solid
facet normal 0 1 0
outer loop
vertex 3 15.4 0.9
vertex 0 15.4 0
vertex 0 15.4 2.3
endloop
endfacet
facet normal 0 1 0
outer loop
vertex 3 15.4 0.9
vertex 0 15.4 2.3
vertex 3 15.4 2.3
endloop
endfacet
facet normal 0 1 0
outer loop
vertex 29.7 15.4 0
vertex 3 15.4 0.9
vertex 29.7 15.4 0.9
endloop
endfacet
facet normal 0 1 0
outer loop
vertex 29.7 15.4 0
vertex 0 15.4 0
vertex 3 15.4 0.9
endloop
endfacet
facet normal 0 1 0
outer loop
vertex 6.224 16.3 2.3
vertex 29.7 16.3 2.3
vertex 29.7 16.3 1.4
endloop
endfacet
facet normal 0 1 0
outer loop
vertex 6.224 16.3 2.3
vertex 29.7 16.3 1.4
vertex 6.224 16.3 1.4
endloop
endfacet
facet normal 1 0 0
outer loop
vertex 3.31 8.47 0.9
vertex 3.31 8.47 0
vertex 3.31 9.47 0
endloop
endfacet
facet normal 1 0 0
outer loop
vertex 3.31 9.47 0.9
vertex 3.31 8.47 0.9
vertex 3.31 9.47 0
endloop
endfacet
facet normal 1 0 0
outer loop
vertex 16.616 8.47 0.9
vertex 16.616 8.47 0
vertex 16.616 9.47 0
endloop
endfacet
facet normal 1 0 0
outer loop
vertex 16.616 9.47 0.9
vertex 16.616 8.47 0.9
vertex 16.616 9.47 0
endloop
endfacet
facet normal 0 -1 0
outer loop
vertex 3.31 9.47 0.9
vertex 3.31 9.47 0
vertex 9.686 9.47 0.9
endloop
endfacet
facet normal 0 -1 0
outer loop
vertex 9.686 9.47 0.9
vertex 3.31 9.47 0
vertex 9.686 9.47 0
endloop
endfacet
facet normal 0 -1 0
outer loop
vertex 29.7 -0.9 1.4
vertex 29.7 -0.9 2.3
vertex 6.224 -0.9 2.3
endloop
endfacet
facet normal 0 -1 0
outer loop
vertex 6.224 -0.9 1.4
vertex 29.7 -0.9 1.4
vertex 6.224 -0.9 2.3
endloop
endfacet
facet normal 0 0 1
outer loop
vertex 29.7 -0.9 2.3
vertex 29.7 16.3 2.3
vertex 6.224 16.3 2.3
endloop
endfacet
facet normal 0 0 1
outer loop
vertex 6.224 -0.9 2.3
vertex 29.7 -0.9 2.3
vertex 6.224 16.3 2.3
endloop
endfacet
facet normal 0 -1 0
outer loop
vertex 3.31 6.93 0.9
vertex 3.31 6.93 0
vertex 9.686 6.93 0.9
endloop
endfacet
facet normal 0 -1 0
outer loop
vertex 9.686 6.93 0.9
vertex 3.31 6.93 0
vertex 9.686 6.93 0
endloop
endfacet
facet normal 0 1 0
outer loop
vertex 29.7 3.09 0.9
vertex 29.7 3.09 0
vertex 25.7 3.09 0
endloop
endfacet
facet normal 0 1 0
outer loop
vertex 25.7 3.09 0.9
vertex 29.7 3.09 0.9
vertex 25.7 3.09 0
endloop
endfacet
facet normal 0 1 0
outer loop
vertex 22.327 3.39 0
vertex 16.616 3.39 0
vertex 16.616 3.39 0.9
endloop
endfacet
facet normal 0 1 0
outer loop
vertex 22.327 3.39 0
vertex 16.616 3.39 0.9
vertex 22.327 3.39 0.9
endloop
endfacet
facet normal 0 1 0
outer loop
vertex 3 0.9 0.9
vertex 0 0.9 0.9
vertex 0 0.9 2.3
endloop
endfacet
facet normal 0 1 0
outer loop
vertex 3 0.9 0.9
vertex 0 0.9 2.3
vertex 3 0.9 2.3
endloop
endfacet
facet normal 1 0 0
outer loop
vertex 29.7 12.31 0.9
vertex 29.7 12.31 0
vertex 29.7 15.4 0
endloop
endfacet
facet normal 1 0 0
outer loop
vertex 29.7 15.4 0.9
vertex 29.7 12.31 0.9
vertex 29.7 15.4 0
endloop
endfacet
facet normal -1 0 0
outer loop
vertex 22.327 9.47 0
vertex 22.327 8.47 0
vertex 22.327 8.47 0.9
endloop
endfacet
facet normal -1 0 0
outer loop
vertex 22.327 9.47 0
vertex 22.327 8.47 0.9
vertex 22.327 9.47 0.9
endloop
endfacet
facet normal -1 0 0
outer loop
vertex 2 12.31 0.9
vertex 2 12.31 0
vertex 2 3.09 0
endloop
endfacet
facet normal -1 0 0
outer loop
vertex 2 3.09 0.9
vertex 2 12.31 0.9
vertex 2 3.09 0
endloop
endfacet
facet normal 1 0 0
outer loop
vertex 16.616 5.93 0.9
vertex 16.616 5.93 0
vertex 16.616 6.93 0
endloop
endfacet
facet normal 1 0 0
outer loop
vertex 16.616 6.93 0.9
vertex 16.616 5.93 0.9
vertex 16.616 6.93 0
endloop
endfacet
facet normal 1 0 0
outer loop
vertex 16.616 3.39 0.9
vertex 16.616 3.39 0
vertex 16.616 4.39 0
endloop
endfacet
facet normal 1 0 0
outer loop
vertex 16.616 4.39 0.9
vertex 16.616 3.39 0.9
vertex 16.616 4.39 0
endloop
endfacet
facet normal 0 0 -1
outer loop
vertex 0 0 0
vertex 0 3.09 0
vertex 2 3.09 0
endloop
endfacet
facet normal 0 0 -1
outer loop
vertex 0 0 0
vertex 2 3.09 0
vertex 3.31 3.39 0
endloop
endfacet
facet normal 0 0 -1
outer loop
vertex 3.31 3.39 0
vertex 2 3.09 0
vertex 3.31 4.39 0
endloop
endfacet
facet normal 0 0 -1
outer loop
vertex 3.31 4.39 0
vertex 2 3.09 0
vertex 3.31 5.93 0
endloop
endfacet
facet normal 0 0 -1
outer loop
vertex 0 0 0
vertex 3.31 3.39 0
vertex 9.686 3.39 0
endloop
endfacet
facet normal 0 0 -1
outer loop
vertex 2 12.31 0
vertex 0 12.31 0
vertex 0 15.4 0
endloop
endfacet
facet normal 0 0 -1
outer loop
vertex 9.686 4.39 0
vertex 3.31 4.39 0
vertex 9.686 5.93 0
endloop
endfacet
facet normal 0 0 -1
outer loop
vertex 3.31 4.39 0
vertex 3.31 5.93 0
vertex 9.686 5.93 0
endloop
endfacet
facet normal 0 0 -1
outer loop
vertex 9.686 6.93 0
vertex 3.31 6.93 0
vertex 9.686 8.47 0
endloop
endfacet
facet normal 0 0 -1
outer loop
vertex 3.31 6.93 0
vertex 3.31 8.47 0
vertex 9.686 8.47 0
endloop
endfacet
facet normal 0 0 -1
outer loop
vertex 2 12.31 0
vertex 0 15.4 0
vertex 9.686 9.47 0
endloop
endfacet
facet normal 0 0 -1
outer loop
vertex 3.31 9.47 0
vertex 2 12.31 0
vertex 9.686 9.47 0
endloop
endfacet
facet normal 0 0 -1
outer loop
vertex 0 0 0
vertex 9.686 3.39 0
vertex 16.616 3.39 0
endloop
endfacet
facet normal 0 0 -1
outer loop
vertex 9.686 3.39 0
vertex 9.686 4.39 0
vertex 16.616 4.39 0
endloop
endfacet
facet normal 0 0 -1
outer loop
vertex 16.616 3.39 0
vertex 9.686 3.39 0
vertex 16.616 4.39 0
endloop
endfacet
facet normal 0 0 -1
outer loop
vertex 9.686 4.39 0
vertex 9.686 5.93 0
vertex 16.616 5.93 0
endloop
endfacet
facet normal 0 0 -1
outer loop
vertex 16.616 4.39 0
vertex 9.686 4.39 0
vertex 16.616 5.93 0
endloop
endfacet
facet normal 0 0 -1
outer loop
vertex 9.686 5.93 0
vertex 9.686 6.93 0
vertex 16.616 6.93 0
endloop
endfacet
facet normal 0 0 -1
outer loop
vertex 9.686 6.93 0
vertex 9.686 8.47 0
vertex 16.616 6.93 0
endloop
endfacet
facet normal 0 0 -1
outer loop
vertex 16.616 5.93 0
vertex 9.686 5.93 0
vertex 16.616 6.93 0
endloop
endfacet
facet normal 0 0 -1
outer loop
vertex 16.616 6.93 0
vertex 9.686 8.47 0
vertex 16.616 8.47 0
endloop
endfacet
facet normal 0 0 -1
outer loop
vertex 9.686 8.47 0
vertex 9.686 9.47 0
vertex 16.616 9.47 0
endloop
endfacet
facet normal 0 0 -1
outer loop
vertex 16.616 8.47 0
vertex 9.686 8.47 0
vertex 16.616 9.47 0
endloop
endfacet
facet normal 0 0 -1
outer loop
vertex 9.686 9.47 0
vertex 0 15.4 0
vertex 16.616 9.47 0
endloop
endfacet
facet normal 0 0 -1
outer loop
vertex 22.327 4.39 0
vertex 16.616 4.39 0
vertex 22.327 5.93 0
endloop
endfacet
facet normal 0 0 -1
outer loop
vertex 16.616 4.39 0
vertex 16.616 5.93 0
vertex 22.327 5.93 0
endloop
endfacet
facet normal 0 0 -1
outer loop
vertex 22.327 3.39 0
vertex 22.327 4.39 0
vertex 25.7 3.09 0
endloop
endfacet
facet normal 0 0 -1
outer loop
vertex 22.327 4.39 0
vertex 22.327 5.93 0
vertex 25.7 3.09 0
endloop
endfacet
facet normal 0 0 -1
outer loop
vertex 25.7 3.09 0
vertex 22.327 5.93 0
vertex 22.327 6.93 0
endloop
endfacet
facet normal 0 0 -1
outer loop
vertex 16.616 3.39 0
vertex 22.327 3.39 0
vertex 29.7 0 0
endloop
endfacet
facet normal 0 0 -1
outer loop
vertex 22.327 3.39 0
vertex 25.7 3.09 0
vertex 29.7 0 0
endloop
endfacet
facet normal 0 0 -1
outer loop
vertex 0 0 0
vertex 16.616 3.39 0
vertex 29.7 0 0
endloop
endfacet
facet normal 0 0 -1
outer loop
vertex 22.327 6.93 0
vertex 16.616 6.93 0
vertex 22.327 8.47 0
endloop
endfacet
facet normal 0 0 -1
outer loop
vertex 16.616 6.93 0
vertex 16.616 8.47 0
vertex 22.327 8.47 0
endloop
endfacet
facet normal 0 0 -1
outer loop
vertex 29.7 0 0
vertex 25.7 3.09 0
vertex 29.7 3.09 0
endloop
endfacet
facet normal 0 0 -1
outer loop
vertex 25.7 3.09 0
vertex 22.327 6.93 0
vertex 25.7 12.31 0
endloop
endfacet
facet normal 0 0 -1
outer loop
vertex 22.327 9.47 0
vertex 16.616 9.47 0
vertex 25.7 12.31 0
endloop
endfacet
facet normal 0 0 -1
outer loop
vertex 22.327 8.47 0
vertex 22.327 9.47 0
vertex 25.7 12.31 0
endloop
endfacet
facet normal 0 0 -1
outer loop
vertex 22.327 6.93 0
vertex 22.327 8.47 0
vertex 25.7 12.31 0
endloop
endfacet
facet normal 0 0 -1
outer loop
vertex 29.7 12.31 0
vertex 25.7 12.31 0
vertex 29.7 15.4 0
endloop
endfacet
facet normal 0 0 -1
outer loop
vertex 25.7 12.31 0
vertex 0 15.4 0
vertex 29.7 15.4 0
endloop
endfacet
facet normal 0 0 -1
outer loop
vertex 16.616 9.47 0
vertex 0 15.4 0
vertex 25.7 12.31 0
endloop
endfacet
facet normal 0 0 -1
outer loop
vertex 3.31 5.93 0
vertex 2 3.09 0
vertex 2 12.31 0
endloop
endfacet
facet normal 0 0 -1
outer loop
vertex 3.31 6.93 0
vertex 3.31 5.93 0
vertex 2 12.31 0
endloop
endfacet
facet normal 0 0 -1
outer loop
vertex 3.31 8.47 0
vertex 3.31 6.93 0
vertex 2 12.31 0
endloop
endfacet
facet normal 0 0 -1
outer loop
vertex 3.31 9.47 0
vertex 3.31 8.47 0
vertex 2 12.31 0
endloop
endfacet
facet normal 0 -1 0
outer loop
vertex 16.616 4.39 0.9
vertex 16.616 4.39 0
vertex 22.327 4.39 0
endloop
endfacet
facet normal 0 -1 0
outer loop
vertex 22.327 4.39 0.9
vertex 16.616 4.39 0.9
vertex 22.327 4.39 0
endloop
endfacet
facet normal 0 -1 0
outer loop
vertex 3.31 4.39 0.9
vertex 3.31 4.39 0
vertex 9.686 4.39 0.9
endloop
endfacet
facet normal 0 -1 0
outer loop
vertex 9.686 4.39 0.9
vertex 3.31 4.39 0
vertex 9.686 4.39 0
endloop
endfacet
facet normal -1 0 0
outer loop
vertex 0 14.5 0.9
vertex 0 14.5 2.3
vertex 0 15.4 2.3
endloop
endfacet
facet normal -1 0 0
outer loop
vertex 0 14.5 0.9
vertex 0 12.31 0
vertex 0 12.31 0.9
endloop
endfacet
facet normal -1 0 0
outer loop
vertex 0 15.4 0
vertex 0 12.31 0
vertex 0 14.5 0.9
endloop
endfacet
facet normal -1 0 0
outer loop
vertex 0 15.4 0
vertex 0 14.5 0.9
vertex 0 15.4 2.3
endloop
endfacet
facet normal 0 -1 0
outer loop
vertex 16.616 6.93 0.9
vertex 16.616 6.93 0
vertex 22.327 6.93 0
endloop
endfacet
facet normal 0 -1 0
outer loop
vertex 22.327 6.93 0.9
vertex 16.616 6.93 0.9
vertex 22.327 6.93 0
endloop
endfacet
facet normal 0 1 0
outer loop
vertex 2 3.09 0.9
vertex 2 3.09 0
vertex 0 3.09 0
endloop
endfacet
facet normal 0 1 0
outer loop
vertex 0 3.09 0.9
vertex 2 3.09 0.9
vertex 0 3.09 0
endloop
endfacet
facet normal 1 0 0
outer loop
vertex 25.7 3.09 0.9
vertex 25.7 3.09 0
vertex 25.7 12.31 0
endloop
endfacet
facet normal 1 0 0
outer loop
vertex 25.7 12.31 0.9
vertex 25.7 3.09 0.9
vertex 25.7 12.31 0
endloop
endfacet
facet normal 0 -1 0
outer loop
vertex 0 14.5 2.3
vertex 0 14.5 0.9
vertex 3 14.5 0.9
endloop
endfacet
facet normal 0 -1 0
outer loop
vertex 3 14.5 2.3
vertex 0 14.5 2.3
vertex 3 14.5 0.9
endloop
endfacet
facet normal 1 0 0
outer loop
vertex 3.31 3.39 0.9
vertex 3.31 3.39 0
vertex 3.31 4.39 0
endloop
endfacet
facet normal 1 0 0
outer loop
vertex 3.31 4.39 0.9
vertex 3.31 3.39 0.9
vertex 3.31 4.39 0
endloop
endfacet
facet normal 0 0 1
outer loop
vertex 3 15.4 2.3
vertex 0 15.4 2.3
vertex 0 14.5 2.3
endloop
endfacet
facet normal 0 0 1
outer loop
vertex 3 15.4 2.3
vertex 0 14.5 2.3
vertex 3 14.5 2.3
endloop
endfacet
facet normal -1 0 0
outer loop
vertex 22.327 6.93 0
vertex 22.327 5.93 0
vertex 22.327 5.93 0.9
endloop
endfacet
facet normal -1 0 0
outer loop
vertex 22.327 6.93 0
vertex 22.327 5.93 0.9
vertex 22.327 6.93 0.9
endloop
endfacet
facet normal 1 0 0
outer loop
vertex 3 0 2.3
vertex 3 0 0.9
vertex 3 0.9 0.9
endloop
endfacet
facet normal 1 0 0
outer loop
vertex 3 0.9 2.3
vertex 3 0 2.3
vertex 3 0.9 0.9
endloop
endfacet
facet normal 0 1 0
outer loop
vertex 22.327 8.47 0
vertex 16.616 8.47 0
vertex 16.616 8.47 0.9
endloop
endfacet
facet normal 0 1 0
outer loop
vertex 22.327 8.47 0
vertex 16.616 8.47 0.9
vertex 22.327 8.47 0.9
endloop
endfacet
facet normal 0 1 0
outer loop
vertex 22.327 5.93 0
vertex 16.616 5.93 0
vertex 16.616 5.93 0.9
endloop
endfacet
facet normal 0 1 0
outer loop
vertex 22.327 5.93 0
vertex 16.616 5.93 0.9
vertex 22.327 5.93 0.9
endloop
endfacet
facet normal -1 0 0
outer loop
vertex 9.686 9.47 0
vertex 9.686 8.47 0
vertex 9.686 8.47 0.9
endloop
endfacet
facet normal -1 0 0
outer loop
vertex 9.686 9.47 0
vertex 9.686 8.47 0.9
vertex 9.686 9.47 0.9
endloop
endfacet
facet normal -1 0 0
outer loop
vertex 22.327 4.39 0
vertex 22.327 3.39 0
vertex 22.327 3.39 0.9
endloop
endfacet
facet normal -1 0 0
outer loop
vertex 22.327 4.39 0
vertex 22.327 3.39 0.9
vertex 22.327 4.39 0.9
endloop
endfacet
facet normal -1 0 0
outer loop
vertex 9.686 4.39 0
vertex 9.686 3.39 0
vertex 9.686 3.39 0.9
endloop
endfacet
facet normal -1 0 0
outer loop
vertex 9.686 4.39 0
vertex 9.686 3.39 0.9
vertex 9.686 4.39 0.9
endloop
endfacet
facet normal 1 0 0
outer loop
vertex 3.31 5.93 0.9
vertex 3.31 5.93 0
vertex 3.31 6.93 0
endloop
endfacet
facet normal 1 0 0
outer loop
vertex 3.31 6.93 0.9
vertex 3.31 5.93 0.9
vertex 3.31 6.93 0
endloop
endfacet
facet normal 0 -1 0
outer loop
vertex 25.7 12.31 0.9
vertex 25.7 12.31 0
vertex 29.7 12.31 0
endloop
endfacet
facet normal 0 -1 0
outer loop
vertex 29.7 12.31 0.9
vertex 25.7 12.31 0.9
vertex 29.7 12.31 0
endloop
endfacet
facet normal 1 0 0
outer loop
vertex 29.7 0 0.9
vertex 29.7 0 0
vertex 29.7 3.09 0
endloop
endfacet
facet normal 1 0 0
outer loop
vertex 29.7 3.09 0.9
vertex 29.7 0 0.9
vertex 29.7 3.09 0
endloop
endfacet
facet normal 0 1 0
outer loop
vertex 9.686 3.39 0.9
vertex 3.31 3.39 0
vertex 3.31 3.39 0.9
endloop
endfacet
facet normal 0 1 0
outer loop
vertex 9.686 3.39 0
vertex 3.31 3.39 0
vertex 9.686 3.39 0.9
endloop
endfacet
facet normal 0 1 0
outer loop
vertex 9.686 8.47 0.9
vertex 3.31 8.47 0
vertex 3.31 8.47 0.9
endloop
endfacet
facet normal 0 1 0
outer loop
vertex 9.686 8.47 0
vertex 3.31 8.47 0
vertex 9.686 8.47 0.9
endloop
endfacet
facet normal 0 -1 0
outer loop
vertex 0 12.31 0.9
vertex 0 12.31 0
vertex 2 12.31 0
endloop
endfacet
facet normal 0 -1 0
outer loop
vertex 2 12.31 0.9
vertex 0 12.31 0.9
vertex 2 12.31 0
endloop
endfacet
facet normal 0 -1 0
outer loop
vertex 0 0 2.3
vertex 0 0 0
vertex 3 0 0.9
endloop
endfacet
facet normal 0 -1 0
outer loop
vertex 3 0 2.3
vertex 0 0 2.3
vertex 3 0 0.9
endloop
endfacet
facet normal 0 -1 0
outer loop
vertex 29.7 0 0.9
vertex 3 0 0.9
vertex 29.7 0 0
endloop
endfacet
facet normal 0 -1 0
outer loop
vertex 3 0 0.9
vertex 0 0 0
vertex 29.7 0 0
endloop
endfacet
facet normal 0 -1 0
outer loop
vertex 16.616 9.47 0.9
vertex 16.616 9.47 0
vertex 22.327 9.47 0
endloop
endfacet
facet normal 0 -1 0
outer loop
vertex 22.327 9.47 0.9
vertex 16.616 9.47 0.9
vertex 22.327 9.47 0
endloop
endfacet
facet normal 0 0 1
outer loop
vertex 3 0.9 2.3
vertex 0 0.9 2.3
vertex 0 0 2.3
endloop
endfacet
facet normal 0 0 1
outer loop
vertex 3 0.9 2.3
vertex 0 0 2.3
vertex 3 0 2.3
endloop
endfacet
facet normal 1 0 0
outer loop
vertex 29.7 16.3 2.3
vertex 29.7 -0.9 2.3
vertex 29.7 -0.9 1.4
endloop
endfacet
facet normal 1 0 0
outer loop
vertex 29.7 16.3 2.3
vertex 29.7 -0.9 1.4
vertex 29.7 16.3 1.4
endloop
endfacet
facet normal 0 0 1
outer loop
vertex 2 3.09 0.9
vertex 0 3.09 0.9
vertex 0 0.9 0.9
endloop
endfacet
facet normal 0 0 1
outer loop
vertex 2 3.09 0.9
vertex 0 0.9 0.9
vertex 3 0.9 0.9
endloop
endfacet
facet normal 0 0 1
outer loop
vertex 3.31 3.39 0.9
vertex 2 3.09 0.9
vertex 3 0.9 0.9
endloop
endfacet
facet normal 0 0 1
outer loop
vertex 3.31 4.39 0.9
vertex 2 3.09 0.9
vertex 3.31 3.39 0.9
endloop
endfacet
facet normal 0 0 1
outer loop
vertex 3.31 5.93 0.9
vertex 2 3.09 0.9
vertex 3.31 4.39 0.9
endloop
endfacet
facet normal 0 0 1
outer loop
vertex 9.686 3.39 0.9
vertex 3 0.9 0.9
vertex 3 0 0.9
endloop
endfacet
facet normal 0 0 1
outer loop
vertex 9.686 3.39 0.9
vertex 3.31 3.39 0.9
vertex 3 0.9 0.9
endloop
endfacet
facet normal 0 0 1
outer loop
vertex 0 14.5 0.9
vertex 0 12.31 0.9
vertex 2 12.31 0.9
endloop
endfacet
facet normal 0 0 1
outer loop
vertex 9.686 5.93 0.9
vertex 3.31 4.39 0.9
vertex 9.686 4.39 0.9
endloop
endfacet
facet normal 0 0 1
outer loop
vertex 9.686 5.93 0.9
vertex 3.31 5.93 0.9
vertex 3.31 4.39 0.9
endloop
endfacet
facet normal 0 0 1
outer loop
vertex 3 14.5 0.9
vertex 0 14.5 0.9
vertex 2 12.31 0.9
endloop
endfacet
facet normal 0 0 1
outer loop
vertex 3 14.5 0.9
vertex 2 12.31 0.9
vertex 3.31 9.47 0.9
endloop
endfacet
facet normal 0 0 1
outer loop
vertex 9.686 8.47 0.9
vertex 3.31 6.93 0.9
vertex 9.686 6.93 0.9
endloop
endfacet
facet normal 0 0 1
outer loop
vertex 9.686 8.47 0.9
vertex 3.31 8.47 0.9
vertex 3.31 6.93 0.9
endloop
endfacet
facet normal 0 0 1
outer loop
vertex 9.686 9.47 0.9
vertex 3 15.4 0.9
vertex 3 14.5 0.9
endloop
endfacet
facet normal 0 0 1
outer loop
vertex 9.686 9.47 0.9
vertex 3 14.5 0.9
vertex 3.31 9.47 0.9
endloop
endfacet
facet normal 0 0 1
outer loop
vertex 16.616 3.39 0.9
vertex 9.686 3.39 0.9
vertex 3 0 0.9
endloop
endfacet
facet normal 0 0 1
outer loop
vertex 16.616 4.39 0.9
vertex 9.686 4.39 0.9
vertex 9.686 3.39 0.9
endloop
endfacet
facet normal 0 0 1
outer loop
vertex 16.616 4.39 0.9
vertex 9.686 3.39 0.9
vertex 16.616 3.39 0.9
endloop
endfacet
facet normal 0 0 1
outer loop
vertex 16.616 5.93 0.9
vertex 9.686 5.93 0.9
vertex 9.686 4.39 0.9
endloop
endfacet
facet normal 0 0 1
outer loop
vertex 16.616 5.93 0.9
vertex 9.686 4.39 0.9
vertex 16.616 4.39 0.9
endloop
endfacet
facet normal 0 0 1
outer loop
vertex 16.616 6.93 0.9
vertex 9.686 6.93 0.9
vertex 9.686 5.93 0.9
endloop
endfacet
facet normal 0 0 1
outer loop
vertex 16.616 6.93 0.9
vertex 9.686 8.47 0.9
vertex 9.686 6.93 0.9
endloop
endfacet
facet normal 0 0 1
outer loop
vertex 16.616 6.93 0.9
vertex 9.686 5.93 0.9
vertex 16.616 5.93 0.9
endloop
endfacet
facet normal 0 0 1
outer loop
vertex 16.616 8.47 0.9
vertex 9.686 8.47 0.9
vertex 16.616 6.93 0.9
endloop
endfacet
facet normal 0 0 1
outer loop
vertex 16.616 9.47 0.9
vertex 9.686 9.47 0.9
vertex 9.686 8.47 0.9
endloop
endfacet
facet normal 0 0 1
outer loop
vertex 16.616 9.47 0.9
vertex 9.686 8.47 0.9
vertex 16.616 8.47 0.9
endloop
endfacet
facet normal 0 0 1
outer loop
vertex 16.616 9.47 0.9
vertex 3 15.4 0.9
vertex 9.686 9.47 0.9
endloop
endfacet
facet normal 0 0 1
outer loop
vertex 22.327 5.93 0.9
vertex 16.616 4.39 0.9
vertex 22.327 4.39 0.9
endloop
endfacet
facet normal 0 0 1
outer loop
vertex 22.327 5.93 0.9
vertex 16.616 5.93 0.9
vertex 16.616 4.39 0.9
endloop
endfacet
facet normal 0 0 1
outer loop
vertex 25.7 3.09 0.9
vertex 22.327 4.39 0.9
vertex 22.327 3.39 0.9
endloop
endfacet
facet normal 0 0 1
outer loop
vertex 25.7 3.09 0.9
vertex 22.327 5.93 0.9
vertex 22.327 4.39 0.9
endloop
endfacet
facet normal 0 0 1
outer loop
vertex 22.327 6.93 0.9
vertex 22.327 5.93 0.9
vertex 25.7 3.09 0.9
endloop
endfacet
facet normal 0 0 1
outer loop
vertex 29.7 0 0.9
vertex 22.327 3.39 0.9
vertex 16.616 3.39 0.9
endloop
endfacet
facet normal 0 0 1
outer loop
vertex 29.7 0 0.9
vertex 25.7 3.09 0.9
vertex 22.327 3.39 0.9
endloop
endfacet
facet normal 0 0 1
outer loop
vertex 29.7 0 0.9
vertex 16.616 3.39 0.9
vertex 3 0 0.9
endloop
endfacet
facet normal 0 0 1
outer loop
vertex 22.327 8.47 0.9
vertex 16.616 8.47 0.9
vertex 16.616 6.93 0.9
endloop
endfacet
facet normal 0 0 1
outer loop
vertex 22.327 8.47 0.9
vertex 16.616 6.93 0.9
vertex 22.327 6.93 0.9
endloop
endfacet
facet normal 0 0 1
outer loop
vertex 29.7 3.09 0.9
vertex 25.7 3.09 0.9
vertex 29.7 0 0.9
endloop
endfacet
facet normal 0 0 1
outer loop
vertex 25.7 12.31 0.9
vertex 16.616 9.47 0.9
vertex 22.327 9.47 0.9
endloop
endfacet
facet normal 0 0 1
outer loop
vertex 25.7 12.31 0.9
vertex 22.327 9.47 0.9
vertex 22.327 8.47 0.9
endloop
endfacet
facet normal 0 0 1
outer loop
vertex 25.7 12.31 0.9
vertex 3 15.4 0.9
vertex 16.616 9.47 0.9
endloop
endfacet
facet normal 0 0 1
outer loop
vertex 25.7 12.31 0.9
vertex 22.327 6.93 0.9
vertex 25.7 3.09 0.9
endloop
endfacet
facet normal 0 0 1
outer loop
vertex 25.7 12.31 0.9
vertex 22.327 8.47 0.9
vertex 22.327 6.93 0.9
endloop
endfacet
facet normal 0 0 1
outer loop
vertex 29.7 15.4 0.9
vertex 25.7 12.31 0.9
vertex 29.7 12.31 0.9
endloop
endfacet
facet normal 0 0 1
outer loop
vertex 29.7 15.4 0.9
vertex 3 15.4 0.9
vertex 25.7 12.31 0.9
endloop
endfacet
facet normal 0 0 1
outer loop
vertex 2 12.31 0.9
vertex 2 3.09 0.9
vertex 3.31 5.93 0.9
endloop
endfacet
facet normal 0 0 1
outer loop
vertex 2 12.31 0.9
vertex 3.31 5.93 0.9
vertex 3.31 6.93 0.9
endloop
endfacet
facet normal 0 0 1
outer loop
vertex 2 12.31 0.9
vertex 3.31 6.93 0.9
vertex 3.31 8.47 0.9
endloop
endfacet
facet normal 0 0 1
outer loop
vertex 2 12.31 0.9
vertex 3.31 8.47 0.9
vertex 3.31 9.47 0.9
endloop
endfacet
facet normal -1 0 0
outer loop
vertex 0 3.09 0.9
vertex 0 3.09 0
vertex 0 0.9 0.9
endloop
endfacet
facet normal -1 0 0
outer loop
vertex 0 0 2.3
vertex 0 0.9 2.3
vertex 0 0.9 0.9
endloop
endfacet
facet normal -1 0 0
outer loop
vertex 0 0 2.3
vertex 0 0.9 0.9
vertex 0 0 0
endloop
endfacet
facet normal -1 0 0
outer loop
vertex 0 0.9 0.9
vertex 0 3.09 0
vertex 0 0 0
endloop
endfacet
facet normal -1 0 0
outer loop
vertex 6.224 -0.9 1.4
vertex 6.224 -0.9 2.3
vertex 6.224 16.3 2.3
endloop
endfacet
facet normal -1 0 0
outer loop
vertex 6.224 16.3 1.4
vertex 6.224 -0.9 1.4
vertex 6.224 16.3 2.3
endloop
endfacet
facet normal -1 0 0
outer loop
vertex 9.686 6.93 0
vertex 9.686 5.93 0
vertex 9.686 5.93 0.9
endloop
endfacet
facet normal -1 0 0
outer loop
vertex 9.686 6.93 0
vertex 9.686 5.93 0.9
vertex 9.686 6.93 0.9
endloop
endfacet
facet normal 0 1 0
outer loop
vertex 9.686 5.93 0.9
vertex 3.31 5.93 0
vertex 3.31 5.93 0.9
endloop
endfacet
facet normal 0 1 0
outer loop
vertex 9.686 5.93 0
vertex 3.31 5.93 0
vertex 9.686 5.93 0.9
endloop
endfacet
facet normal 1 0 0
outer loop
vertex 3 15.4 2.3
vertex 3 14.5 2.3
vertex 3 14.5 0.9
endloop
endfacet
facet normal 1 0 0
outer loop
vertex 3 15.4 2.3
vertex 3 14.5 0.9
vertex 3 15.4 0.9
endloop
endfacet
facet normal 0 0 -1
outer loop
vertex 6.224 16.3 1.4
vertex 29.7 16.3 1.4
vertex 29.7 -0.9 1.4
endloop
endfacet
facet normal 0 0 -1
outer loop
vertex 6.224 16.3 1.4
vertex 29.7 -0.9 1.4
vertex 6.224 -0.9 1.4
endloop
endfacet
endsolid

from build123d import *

# Parameters (mm, degrees)
SKETCH1_W           = 6.376063003
SKETCH1_H           = 1
SKETCH1_W_2         = 5.71073469
BOSS_EXTRUDE1_DEPTH = 0.9
SKETCH4_W           = 3
SKETCH4_H           = 0.9
BOSS_EXTRUDE3_DEPTH = 1.399999972
SKETCH5_W           = 23.476292827
SKETCH5_H           = 17.2
BOSS_EXTRUDE4_DEPTH = 0.9


with BuildPart() as part:
    # Sketch1 → Boss-Extrude1 (new body)
    with BuildSketch(Plane.XY):
        Polygon((29.7, 12.31), (29.7, 15.4), (0, 15.4), (0, 12.31), (2, 12.31), (2, 3.09), (0, 3.09), (0, 0), (29.7, 0), (29.7, 3.09), (25.7, 3.09), (25.7, 12.31), align=None)
        with Locations((6.497879886, 3.89)):
            Rectangle(SKETCH1_W, SKETCH1_H, mode=Mode.SUBTRACT)
        with Locations((19.471781996, 3.89)):
            Rectangle(SKETCH1_W_2, SKETCH1_H, mode=Mode.SUBTRACT)
        with Locations((6.497879886, 6.43)):
            Rectangle(SKETCH1_W, SKETCH1_H, mode=Mode.SUBTRACT)
        with Locations((19.471781996, 6.43)):
            Rectangle(SKETCH1_W_2, SKETCH1_H, mode=Mode.SUBTRACT)
        with Locations((6.497879886, 8.97)):
            Rectangle(SKETCH1_W, SKETCH1_H, mode=Mode.SUBTRACT)
        with Locations((19.471781996, 8.97)):
            Rectangle(SKETCH1_W_2, SKETCH1_H, mode=Mode.SUBTRACT)
    extrude(amount=BOSS_EXTRUDE1_DEPTH)

    # Sketch4 → Boss-Extrude3 (add)
    with BuildSketch(Plane.XY.offset(0.9)):
        with Locations((1.5, 14.95)):
            Rectangle(SKETCH4_W, SKETCH4_H)
        with Locations((1.5, 0.45)):
            Rectangle(SKETCH4_W, SKETCH4_H)
    extrude(amount=BOSS_EXTRUDE3_DEPTH)


with BuildPart() as body_2:
    # Sketch5 → Boss-Extrude4 (new body)
    with BuildSketch(Plane(origin=(0, 0, 2.299999972), x_dir=(-1, 0, 0), z_dir=(0, 0, -1))):
        with Locations((-17.961853587, 7.7)):
            Rectangle(SKETCH5_W, SKETCH5_H)
    extrude(amount=BOSS_EXTRUDE4_DEPTH)


solid = Compound([part.part, body_2.part])
